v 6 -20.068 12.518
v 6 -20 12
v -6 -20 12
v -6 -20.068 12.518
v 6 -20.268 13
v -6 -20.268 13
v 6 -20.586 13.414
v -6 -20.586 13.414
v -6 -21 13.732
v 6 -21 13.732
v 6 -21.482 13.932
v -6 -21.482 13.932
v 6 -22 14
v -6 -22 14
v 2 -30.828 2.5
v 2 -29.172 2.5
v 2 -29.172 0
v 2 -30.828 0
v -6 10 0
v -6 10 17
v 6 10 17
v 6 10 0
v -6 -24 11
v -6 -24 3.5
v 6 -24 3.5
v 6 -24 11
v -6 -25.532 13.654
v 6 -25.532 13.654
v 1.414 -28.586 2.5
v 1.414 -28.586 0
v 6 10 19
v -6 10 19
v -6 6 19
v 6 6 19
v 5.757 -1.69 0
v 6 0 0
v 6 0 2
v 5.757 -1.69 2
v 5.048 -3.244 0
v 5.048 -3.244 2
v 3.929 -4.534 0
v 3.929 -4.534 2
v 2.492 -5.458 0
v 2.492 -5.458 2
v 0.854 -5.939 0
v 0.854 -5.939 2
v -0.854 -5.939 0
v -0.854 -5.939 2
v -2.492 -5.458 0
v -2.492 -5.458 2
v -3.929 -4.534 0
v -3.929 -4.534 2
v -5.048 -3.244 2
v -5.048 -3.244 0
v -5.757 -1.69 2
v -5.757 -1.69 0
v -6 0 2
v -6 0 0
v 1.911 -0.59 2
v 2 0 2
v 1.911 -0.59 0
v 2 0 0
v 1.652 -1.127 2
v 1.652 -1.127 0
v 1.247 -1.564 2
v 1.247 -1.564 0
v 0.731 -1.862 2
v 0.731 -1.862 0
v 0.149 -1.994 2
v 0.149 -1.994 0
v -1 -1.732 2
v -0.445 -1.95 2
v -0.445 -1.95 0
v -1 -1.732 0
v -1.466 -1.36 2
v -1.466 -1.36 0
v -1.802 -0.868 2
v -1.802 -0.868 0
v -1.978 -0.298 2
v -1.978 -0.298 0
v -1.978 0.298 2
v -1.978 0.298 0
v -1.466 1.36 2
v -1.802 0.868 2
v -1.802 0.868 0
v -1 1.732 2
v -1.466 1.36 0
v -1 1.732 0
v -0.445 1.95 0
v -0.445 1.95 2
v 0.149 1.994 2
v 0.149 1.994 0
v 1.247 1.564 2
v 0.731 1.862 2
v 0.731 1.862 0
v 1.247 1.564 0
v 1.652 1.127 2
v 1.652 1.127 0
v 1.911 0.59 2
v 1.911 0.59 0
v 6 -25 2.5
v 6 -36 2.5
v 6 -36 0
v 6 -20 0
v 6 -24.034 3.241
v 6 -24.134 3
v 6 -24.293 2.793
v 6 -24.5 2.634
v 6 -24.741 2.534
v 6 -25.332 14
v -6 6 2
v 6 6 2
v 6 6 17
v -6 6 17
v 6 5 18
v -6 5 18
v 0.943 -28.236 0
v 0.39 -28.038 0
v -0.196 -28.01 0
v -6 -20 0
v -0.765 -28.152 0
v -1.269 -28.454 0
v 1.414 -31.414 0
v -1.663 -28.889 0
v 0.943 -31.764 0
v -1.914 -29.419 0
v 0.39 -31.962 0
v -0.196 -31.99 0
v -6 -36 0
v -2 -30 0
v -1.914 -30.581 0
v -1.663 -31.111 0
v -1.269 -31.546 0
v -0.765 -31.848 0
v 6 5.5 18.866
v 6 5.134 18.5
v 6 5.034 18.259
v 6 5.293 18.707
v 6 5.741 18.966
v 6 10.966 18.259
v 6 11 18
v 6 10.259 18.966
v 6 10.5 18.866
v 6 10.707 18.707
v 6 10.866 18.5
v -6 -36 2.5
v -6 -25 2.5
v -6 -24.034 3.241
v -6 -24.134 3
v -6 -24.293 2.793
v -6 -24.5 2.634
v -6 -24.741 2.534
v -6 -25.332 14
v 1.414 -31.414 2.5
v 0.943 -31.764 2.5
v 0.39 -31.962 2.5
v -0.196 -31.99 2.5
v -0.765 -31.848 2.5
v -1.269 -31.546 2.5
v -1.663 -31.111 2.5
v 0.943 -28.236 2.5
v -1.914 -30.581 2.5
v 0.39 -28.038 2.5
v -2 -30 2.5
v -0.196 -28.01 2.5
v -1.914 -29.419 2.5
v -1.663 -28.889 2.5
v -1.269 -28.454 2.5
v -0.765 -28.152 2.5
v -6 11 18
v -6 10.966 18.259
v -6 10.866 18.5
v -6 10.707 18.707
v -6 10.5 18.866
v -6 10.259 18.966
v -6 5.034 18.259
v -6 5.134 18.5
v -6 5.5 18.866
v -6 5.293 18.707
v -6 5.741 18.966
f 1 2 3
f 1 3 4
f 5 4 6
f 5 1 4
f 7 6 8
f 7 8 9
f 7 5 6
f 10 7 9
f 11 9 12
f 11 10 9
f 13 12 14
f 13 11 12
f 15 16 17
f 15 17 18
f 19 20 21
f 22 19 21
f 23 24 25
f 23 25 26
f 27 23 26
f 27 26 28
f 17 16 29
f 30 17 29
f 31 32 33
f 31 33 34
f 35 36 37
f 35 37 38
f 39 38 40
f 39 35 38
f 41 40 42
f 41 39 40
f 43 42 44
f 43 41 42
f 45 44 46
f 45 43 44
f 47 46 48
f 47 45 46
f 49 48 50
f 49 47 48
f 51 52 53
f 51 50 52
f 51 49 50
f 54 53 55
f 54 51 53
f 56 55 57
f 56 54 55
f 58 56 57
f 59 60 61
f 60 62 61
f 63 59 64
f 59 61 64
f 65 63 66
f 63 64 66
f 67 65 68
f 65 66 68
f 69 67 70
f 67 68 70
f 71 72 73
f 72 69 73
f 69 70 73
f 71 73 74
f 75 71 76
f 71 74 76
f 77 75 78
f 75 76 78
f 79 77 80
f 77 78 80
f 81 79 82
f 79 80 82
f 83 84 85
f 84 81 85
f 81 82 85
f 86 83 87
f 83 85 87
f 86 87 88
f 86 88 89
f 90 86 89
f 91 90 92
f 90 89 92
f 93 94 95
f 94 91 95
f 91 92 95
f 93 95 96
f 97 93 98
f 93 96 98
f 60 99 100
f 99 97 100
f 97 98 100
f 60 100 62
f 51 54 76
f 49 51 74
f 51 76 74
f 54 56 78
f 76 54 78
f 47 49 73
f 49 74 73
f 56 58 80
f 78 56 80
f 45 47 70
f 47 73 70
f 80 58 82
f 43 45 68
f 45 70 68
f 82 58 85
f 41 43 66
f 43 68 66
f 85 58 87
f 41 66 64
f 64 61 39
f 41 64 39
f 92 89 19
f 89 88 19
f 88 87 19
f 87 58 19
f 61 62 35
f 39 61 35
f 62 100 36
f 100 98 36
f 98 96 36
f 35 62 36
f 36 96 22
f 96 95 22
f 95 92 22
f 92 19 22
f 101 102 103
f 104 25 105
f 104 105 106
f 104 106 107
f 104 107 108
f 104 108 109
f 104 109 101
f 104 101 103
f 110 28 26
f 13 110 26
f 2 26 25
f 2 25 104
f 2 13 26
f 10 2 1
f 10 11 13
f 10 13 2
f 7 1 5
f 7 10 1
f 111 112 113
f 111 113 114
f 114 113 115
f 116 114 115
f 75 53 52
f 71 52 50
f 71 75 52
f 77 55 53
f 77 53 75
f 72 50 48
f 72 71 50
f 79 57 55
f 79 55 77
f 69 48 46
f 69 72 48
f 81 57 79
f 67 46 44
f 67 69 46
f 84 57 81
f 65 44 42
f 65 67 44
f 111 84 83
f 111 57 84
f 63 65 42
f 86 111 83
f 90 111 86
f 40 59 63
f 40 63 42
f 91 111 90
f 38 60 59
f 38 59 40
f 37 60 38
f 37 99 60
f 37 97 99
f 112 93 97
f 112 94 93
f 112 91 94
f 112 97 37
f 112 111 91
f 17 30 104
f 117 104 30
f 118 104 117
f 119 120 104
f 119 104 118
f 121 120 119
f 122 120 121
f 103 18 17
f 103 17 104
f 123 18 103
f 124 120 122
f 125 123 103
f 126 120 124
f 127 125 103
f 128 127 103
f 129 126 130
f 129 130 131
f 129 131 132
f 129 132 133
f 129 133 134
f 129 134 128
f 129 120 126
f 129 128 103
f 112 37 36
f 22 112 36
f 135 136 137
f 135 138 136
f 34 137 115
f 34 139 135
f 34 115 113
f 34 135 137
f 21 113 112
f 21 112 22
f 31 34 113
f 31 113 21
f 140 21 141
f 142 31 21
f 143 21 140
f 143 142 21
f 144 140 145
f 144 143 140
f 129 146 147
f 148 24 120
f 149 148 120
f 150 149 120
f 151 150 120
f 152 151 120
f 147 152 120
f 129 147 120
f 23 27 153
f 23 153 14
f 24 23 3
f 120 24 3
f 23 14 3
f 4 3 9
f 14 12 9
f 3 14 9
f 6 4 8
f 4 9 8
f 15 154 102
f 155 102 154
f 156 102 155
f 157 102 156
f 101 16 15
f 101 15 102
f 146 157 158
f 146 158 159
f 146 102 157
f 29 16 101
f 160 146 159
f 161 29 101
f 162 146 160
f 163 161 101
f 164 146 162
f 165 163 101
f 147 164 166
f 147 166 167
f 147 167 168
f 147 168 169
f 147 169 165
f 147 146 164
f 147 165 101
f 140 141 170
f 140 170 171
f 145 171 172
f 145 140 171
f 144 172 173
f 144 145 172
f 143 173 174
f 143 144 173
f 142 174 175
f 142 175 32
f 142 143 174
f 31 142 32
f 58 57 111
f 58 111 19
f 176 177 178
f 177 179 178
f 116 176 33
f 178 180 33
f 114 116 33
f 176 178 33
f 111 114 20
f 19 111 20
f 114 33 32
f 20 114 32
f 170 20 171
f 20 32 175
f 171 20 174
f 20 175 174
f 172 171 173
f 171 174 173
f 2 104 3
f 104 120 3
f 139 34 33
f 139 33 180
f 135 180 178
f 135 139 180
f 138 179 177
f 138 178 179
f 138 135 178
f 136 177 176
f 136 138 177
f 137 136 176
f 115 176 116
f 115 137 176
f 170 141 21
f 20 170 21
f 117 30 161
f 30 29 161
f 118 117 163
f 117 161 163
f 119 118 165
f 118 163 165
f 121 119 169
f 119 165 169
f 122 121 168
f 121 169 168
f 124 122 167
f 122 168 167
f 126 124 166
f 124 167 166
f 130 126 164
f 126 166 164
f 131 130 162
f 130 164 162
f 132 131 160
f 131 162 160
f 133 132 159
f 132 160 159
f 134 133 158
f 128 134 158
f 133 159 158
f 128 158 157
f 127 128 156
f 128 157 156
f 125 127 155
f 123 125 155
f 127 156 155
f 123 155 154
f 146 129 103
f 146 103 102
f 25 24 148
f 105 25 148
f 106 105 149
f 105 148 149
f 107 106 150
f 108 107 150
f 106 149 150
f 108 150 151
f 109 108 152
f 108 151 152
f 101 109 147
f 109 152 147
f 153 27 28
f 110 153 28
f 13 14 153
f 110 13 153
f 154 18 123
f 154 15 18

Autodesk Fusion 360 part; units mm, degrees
sketch "Sketch1" plane through (0, 0, 0) normal (0, 0, 1) x (1, 0, 0)
  circle A0 centre (0, 0) radius 2
  line L0 (0, 0) -> (-6, 0) construction
  arc A1 (-6, 0) -> (6, 0) centre (0, 0) ccw
  line L1 (6, 0) -> (6, 6)
  line L2 (6, 6) -> (-6, 6)
  line L3 (-6, 6) -> (-6, 0)
  line L4 (-6, 6) -> (-6, 10)
  line L5 (-6, 10) -> (6, 10)
  line L6 (6, 10) -> (6, 6)
  dimension "d1" = 4
  dimension "d2" = 4
  dimension "d3" = 4
  dimension "d4" = 6
extrude "Extrude1" add sketch "Sketch1" along normal blind 2 contours A1 L1 L2 L3 makes body 1
extrude "Extrude2" add sketch "Sketch1" along normal blind 19 contours L2 L4 L5 L6 bodies 1
sketch "Sketch2" plane through (6, 0, 0) normal (1, 0, 0) x (0, 1, 0)
  line L0 (0, 0) -> (10, 0)
  line L1 (10, 0) -> (10, 19)
  line L2 (10, 19) -> (6, 19)
  line L3 (6, 19) -> (6, 2)
  line L4 (6, 2) -> (0, 2)
  line L5 (0, 2) -> (0, 0)
sketch "Sketch3" plane through (6, 0, 0) normal (1, 0, 0) x (0, 1, 0)
  line L0 (0, 0) -> (10, 0)
  line L1 (10, 0) -> (10, 19)
  line L2 (10, 19) -> (6, 19)
  line L3 (6, 19) -> (6, 2)
  line L4 (6, 2) -> (0, 2)
  line L5 (0, 2) -> (0, 0)
  arc A0 (11, 18) -> (10, 19) centre (10, 18) ccw
  line L6 (11, 18) -> (10, 17)
  point P0 (10, 19)
  dimension "d11" = 45
  dimension "d12" = 2
extrude "Extrude3" add sketch "Sketch3" against normal blind 12 separate body contours L1 A0 L6 makes body 2
ref_plane "WorkPlane1" through (0, 8, 9.5) normal (0, 1, 0) x (-1, 0, 0)
mirror "Mirror1" about plane through (0, 8, 9.5) normal (0, 1, 0) of bodies 2 makes body 3
combine "Combine1" operation add target body 1 tool bodies 2 3
sketch "Sketch1 (2)" plane through (0, 0, 0) normal (1, 0, 0) x (0, 1, 0) in component "v2"
  line L0 (2, 2) -> (2, 0) construction
  line L1 (2, 0) -> (10, 0) construction
  line L2 (10, 0) -> (10, 17) construction
  line L3 (10, 17) -> (11, 18) construction
  arc A0 (11, 18) -> (10, 19) centre (10, 18) ccw construction
  line L4 (10, 19) -> (6, 19) construction
  arc A1 (6, 19) -> (5, 18) centre (6, 18) ccw construction
  line L5 (5, 18) -> (6, 17) construction
  line L6 (6, 17) -> (6, 2) construction
  line L7 (6, 2) -> (2, 2) construction
  line L8 (-6, 2) -> (-6, 0) construction
  line L9 (-6, 0) -> (-2, 0) construction
  line L10 (-2, 0) -> (-2, 2) construction
  line L11 (-2, 2) -> (-6, 2) construction
  line L12 (0, 0) -> (-20, 0) construction
  line L13 (-20, 0) -> (-20, 14)
  line L14 (-20, 14) -> (-25.7321, 14)
  line L15 (-20, 0) -> (-36, 0)
  line L16 (-36, 0) -> (-36, 2.5)
  line L17 (-24, 11) -> (-25.7321, 14)
  line L18 (-36, 2.5) -> (-24, 2.5)
  line L19 (-24, 2.5) -> (-24, 11)
  dimension "d17" = 20
  dimension "d18" = 14
  dimension "d20" = 2.5
  dimension "d23" = 4
  dimension "d24" = 150
  dimension "d25" = 3
  dimension "d26" = 16
  dimension "d27" = 4
  dimension "d28" = 4
extrude "Extrude1'" add sketch "Sketch1 (2)" along normal mid plane 12 separate body makes body 4 in component "v2"
fillet "Fillet1" radius 2 1 edges at (0, -20, 14) on bodies 4 in component "v2"
sketch "Sketch2 (2)" plane through (0, 0, 2.5) normal (0, 0, 1) x (-1, 0, 0) in component "v2"
  line L0 (6, 36) -> (-6, 36)
  line L1 (-6, 36) -> (-6, 24)
  line L2 (-6, 24) -> (6, 24)
  line L3 (6, 24) -> (6, 36)
  line L4 (6, 24) -> (-6, 24)
  line L5 (0, 24) -> (0, 30) construction
  circle A0 centre (0, 30) radius 2
  line L6 (-2, 29.1716) -> (-2, 30.8284)
  line L7 (-2, 30) -> (0, 30)
  line L8 (-2, 29.1716) -> (-1.4142, 28.5858)
  line L9 (-2, 30.8284) -> (-1.4142, 31.4142)
  dimension "d33" = 6
  dimension "d34" = 4
  dimension "d39" = 90
extrude "Extrude2'" cut sketch "Sketch2 (2)" against normal through all contours A0 | A0 L6 L9 | A0 L6 L8 bodies 4 in component "v2"
chamfer "Chamfer1" distance 0.4 angle 45 1 edges at (0, -25.7321, 14) on bodies 4 in component "v2"
fillet "Fillet2" radius 1 1 edges at (0, -24, 2.5) on bodies 4 in component "v2"
component "v2" placed x (1, 0, 0) y (0, 1, 0) z (0, 0, 1) at (0, 0, 0)
equation "d3 = d2"
